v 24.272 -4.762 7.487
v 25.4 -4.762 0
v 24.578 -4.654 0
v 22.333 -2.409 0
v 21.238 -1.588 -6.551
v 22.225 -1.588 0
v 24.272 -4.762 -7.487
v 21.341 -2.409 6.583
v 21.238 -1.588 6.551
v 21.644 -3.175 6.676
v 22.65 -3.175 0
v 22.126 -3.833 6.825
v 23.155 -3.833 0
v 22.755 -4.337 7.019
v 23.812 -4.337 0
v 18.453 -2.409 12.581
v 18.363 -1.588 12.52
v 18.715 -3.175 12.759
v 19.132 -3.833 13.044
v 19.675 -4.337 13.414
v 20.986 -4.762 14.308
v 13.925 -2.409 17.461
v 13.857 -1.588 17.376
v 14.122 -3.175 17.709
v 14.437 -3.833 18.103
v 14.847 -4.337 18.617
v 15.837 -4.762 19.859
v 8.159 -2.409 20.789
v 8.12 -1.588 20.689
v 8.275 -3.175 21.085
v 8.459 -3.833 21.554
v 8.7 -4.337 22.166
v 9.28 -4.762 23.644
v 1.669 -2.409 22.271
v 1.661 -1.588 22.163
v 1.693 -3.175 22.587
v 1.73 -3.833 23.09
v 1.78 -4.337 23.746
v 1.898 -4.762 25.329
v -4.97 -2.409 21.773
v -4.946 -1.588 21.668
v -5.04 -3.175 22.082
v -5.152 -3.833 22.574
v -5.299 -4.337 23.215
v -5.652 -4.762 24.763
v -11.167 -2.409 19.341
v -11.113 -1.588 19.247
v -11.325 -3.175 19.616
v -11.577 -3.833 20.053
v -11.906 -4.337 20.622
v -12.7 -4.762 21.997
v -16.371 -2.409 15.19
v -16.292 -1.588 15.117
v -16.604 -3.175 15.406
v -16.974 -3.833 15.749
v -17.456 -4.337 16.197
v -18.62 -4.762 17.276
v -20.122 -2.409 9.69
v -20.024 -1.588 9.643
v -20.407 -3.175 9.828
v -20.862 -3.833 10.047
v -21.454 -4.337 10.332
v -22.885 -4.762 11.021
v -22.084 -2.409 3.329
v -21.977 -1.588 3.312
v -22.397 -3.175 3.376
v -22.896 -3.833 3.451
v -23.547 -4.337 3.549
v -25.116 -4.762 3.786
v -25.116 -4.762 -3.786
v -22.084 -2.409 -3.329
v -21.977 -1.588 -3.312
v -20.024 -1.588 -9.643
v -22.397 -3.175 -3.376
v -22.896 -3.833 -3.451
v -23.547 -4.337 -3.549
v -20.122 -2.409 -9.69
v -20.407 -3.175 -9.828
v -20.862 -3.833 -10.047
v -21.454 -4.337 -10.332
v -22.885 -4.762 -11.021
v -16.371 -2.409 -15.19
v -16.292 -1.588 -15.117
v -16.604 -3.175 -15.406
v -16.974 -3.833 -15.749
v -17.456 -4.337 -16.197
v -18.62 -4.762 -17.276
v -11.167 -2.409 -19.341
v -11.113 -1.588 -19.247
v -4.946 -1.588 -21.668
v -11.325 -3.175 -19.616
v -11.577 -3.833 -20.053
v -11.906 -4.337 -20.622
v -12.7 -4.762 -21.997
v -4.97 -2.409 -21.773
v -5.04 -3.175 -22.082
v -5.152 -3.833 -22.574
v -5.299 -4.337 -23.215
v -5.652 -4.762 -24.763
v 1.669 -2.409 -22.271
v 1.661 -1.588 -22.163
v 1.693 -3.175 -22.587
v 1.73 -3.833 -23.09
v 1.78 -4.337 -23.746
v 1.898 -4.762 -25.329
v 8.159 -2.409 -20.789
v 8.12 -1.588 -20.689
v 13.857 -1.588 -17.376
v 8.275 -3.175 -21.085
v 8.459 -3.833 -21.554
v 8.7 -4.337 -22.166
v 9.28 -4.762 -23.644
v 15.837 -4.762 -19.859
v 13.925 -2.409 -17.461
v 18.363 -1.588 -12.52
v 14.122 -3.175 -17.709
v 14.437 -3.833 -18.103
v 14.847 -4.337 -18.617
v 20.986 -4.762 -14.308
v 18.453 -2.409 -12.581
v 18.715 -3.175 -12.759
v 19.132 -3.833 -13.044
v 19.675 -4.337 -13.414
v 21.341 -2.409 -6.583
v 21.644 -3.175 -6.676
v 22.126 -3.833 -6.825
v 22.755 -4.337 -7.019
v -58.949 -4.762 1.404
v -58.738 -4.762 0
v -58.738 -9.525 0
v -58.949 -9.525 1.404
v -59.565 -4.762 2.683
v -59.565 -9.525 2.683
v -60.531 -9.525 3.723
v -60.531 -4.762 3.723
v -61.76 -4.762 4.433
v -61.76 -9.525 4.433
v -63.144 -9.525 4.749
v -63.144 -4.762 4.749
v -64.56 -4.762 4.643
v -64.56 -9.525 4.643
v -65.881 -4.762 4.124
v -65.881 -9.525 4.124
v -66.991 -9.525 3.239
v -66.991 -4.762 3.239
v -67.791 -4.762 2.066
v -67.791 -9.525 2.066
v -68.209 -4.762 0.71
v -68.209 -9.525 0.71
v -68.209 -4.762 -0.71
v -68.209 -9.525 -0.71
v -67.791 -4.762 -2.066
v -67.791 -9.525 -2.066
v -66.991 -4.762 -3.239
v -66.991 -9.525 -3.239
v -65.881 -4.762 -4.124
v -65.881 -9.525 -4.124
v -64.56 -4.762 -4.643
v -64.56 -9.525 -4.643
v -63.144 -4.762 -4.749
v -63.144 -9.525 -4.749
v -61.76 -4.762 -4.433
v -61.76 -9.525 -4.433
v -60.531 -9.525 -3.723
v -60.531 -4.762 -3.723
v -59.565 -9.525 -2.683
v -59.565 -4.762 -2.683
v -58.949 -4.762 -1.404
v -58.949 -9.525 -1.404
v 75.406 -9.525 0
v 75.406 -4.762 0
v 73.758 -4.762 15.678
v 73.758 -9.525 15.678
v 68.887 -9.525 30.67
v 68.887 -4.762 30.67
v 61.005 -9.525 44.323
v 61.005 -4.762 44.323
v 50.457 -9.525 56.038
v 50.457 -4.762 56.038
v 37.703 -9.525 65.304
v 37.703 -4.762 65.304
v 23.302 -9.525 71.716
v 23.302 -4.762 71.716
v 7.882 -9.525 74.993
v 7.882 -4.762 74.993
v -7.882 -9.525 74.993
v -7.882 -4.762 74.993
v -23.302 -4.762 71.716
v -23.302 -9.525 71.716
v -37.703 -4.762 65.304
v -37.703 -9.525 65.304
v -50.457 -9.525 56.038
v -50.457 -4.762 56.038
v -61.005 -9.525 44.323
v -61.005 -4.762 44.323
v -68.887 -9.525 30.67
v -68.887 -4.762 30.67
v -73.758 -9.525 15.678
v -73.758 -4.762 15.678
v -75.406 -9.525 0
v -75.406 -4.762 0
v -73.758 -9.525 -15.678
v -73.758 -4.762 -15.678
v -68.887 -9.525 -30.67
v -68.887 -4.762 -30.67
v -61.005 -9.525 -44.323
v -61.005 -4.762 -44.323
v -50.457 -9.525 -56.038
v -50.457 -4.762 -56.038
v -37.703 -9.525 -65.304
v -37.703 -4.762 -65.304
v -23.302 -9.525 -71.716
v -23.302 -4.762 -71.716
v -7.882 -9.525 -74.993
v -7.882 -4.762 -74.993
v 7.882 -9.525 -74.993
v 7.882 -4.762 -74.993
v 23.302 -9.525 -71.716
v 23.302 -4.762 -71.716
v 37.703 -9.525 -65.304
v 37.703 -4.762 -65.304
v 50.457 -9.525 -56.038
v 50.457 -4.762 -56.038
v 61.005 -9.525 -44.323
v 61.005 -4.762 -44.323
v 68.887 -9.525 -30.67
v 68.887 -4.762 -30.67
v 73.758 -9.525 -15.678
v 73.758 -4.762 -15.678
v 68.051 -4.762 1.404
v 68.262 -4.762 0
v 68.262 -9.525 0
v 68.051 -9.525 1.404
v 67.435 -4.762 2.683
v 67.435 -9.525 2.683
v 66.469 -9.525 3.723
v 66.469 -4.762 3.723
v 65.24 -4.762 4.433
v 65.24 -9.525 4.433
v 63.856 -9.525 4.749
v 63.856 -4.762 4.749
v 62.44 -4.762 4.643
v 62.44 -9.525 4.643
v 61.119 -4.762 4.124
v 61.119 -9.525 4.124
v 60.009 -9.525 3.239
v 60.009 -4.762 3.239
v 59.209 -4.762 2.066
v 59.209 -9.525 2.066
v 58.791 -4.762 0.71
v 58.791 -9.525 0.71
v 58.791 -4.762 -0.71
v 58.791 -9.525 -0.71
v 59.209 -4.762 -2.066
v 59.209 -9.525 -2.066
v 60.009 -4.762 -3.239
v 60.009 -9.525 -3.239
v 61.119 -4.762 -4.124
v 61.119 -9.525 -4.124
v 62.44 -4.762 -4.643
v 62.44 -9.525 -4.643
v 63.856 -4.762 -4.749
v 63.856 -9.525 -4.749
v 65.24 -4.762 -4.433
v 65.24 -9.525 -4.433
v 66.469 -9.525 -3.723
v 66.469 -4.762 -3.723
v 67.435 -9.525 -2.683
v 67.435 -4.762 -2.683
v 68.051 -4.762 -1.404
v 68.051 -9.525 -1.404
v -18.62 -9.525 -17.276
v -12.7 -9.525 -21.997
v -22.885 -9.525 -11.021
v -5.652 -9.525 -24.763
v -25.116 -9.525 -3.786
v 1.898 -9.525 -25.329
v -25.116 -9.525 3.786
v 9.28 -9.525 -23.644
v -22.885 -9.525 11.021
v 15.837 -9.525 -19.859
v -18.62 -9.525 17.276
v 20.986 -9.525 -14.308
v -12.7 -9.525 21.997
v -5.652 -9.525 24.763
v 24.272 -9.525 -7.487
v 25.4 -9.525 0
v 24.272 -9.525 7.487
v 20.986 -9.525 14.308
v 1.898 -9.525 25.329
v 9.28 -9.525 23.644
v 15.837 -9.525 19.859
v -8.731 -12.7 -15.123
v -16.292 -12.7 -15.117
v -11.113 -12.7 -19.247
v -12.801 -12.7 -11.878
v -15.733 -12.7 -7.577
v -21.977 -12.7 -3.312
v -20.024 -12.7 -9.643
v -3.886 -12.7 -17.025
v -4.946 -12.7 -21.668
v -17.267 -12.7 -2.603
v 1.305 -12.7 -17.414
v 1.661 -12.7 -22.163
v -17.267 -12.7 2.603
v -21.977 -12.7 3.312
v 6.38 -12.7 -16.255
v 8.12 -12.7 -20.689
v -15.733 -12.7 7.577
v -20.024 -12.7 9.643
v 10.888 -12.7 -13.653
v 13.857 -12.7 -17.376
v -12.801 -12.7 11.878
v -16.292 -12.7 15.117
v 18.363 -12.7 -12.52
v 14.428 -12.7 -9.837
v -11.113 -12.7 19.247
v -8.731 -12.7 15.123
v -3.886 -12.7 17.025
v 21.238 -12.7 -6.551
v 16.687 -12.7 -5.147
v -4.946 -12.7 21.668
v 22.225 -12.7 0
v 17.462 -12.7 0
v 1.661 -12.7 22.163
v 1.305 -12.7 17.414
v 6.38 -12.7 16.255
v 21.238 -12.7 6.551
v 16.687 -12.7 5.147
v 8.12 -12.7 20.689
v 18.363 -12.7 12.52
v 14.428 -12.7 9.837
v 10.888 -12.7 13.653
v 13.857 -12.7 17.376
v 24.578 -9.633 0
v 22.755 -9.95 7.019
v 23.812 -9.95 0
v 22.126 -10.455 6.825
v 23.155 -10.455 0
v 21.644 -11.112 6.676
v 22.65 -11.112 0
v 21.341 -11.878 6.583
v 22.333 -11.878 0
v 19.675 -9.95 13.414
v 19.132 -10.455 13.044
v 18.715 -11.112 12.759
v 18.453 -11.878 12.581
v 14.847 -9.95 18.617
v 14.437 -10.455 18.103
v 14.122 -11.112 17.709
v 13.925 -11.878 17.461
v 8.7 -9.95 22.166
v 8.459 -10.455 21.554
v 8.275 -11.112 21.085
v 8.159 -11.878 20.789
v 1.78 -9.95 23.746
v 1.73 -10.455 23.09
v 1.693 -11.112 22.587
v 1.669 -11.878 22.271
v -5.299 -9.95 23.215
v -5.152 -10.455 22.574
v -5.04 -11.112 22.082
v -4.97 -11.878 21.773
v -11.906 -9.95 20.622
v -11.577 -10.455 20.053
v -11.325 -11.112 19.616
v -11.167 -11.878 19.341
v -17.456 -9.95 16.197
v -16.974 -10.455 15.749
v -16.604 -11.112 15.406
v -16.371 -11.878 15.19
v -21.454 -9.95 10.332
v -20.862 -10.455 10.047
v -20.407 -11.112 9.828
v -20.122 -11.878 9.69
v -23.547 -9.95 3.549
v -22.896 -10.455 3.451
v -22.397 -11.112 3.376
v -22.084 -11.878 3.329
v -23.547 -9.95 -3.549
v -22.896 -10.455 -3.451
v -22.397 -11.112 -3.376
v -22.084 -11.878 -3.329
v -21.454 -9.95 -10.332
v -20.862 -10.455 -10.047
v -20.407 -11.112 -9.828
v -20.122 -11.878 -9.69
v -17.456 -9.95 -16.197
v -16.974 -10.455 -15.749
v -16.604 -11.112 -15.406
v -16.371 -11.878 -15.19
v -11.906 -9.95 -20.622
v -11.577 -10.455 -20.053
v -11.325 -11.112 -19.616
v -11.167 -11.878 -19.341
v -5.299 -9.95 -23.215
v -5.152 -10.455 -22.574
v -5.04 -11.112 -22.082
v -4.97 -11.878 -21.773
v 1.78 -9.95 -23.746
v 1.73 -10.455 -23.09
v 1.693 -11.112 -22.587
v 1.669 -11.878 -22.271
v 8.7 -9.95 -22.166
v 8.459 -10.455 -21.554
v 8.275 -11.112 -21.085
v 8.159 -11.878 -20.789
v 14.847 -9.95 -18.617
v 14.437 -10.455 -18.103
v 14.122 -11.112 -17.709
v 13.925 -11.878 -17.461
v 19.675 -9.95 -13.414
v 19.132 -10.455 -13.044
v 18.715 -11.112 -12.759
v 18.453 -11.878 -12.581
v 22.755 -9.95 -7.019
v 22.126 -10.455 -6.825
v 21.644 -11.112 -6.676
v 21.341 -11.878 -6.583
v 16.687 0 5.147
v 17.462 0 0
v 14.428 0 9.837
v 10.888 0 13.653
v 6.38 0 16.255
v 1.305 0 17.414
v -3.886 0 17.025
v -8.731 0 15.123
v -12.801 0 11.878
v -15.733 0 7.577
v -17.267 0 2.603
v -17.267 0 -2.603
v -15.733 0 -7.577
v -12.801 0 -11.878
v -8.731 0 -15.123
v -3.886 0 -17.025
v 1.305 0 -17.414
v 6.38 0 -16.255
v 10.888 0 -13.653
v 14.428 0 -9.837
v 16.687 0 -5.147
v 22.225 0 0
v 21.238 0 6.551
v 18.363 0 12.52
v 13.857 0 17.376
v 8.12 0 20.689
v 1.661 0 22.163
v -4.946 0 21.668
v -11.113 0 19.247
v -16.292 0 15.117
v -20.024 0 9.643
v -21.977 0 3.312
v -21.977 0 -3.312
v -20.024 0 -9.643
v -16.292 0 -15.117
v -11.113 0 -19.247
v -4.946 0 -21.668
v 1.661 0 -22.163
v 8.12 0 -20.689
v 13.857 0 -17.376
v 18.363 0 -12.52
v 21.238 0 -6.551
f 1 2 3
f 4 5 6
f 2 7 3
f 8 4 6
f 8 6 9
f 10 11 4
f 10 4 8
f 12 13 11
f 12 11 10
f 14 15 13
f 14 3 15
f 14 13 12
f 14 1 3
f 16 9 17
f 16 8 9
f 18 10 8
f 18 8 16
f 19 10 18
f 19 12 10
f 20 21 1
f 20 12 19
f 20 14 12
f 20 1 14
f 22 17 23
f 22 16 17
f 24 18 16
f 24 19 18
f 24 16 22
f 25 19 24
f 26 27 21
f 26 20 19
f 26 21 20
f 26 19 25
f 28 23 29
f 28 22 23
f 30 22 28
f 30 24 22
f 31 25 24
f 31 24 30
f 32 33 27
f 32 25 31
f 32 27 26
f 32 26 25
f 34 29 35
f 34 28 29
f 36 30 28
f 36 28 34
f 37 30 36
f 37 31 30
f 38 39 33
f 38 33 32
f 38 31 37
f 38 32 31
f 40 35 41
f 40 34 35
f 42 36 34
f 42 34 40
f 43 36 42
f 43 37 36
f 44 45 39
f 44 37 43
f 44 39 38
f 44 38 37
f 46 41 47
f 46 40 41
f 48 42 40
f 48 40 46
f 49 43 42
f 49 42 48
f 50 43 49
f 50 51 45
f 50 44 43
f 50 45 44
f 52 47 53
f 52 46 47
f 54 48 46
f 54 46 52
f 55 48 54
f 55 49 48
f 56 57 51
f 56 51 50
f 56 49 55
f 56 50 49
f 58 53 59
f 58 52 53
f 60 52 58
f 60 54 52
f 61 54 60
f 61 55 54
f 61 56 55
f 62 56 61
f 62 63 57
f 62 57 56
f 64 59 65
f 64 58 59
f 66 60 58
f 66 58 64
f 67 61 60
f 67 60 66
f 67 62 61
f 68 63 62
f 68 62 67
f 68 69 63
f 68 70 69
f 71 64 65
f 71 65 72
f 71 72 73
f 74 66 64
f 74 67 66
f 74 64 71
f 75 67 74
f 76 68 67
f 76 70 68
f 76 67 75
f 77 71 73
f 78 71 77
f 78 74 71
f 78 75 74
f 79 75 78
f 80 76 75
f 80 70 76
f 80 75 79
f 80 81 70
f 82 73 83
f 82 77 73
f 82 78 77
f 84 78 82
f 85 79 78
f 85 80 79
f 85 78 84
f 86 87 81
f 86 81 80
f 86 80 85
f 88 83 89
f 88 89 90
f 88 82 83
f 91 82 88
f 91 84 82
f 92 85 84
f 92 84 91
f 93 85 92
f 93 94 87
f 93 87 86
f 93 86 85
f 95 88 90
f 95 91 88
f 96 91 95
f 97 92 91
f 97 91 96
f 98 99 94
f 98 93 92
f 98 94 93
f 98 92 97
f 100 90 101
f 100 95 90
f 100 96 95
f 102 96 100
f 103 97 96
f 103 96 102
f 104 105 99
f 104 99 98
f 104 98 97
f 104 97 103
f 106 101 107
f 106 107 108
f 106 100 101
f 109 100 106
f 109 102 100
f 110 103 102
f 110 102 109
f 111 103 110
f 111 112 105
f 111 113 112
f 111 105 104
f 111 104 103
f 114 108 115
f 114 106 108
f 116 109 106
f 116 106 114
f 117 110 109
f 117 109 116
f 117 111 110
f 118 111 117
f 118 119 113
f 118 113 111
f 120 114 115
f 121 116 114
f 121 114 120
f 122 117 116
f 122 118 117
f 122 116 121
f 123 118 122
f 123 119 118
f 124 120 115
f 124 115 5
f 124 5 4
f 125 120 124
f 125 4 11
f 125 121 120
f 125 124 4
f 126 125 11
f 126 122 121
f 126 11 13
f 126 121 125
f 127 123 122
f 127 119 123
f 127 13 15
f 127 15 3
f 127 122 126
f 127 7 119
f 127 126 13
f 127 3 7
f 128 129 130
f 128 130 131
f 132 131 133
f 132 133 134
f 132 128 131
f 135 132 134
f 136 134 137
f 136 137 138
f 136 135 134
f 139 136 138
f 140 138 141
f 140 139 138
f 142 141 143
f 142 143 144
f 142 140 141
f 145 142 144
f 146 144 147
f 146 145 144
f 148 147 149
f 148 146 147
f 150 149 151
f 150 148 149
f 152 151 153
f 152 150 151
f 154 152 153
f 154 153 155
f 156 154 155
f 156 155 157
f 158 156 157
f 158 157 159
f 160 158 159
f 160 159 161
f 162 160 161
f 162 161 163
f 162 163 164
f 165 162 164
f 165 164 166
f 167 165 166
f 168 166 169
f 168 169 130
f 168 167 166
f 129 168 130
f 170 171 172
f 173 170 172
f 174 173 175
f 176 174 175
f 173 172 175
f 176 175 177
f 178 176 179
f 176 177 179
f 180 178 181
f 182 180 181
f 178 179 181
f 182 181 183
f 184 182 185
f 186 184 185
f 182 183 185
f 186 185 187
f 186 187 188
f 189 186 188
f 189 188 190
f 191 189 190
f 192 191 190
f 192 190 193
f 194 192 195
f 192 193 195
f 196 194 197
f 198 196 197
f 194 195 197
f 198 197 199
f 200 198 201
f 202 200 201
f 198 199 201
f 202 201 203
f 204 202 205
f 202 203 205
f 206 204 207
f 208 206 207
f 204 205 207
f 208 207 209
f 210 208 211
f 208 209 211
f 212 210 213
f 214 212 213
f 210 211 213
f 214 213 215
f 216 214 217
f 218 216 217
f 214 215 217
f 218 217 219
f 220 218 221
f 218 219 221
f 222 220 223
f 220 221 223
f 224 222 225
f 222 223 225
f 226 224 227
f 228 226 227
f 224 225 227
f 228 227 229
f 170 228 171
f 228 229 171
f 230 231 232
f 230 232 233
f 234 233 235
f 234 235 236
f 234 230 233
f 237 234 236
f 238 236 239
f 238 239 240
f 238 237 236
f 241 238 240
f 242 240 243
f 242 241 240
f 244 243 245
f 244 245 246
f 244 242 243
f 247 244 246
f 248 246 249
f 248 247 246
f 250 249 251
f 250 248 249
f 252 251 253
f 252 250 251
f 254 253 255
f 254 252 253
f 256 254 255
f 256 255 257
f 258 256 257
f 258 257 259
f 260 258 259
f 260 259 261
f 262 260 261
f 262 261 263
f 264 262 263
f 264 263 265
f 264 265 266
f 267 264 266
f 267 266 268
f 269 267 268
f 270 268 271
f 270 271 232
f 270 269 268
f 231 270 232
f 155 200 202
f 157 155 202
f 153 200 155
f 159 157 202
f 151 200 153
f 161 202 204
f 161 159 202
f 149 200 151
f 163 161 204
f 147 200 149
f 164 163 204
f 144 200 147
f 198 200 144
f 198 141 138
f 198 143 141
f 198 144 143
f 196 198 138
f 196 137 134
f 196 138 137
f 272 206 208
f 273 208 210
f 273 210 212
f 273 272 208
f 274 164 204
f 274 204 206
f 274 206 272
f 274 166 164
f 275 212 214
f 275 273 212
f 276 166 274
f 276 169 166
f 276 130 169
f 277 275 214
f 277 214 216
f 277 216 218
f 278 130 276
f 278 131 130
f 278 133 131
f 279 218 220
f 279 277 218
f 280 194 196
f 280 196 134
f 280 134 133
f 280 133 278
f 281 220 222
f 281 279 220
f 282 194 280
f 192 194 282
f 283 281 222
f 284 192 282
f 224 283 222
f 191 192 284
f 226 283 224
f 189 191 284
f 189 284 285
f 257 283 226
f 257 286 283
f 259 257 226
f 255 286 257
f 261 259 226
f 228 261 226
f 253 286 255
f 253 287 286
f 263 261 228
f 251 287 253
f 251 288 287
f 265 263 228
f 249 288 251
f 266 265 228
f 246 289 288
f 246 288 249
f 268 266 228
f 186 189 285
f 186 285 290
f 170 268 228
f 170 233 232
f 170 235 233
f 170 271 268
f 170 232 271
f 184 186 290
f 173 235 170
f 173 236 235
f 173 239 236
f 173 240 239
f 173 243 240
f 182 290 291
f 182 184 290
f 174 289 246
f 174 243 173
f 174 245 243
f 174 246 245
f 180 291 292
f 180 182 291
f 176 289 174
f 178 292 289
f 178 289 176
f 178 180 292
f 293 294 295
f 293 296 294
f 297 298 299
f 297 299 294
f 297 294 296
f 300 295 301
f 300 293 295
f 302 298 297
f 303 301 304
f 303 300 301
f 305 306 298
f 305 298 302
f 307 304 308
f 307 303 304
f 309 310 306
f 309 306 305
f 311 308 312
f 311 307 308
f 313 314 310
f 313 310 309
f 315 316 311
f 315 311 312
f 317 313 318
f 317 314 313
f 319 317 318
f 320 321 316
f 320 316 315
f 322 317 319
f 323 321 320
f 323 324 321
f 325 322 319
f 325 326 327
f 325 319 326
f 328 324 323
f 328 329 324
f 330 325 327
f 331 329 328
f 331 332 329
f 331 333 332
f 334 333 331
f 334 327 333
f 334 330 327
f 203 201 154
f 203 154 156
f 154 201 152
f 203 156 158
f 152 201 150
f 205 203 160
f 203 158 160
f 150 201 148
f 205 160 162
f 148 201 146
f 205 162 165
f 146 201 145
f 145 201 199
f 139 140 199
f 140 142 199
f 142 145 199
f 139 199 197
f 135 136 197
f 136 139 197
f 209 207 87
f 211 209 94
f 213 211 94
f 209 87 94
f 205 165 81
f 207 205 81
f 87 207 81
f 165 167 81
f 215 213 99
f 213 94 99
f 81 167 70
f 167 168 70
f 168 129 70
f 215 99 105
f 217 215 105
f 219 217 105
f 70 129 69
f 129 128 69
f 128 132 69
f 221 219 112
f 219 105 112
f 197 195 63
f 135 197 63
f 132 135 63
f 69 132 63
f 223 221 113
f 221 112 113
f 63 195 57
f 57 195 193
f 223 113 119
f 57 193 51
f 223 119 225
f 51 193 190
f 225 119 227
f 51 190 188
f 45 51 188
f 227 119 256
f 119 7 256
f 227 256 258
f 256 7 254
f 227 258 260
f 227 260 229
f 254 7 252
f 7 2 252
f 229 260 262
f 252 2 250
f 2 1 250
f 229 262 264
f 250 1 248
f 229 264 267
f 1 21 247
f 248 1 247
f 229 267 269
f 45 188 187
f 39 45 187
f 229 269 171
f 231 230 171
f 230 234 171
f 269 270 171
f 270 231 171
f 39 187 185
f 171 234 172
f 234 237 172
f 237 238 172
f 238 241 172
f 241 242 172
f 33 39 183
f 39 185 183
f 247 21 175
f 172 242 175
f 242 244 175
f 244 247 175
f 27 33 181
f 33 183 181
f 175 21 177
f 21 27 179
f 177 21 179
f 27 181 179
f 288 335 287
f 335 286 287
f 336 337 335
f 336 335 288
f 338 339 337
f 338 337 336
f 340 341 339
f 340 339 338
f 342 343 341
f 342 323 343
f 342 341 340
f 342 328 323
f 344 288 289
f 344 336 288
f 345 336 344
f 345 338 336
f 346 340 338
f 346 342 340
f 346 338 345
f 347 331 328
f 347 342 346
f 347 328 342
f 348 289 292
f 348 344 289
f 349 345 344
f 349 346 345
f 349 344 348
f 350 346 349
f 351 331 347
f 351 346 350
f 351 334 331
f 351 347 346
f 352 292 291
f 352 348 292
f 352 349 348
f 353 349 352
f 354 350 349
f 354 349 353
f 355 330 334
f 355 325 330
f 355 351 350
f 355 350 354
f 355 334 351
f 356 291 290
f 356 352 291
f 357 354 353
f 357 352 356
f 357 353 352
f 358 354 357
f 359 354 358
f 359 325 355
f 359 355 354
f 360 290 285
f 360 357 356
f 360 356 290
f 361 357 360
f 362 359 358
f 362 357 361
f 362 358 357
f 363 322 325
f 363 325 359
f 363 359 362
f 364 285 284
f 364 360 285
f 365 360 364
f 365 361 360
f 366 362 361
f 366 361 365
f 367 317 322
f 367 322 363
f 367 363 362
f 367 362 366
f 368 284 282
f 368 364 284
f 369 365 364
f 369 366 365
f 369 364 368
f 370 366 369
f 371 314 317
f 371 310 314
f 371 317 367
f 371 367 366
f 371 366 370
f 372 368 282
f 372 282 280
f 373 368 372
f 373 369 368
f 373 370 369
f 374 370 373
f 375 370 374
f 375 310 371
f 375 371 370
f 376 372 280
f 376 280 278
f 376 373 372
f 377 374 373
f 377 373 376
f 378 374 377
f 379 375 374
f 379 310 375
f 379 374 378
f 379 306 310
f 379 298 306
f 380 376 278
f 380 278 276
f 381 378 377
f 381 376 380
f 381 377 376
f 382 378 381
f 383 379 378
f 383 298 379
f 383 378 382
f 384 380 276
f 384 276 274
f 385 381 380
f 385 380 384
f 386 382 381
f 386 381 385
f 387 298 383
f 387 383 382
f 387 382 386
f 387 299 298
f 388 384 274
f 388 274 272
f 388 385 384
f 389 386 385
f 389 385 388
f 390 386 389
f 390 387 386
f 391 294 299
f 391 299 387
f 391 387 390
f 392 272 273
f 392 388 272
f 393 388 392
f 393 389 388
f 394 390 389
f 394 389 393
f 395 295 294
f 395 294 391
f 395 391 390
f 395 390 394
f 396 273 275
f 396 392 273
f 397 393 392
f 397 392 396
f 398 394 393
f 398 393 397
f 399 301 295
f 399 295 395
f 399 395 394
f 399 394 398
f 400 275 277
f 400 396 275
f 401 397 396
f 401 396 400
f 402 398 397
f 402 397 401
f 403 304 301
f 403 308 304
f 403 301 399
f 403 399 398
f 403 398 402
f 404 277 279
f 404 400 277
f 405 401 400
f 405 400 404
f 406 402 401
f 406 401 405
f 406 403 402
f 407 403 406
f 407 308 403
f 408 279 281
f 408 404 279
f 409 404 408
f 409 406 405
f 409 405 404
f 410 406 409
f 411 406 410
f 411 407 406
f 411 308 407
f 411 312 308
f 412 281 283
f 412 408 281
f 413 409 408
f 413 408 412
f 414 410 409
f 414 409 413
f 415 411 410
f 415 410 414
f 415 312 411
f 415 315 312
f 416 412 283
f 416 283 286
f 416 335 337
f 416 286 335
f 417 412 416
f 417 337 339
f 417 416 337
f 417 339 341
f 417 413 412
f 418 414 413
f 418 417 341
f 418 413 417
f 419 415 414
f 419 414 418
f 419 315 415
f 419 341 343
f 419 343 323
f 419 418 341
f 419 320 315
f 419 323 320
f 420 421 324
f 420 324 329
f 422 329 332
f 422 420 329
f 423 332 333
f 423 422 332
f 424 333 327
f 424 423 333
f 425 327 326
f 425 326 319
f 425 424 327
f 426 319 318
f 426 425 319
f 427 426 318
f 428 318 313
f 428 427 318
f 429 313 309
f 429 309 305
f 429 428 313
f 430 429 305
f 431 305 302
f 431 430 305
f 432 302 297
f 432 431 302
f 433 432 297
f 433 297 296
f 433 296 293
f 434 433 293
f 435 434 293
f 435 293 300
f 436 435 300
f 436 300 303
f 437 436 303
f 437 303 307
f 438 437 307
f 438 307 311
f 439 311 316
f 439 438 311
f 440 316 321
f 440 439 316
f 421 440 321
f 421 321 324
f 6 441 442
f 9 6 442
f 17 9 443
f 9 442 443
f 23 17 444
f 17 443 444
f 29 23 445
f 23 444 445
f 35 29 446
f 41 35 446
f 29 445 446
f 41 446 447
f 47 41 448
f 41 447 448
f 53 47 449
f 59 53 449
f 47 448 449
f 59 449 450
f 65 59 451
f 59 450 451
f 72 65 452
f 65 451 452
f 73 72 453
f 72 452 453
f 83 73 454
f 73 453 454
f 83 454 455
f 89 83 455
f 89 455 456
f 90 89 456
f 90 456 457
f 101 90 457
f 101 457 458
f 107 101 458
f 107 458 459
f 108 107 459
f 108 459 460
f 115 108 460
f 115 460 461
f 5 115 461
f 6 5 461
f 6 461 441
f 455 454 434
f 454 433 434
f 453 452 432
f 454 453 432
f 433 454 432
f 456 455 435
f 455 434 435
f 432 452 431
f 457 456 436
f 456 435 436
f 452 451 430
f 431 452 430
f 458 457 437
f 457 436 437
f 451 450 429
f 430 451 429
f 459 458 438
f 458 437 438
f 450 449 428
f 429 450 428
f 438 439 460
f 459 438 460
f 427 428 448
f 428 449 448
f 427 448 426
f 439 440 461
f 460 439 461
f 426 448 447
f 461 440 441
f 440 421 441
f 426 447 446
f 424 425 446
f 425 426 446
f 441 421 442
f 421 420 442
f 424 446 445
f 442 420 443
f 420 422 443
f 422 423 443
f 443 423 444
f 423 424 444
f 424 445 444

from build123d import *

# Parameters (mm, degrees)
F0_R     = 22.225
F0_R_2   = 17.4625
F1_DEPTH = 12.7
F2_START = 4.7625
F0_R_3   = 75.40625
F0_R_4   = 4.7625
F2_DEPTH = 4.7625
F3_R     = 3.17499


# Not quite as in the source:
# - a fillet or chamfer is up to 0.001 mm smaller than in the source, because OpenCascade refuses the exact size


with BuildPart() as f1:
    # F0 (on Front) → F1 (new body)
    with BuildSketch(Plane.XZ):
        Circle(F0_R)
        Circle(F0_R_2, mode=Mode.SUBTRACT)
    extrude(amount=F1_DEPTH)

    # F0 (on Front) → F2 (join)
    with BuildSketch(Plane.XZ.offset(F2_START)):
        Circle(F0_R_3)
        with Locations((-63.5, 0)):
            Circle(F0_R_4, mode=Mode.SUBTRACT)
        Circle(F0_R, mode=Mode.SUBTRACT)
        with Locations((63.5, 0)):
            Circle(F0_R_4, mode=Mode.SUBTRACT)
    extrude(amount=F2_DEPTH)

    # F3 (radius 3.175 in the source; OpenCascade refuses exactly that, so slightly less here)
    f3_edges = [f1.edges().sort_by_distance(p)[0] for p in [
        (-22.225, -9.525, 0),
        (-22.225, -4.7625, 0),
    ]]
    fillet(f3_edges, radius=F3_R)


solid = f1.part
